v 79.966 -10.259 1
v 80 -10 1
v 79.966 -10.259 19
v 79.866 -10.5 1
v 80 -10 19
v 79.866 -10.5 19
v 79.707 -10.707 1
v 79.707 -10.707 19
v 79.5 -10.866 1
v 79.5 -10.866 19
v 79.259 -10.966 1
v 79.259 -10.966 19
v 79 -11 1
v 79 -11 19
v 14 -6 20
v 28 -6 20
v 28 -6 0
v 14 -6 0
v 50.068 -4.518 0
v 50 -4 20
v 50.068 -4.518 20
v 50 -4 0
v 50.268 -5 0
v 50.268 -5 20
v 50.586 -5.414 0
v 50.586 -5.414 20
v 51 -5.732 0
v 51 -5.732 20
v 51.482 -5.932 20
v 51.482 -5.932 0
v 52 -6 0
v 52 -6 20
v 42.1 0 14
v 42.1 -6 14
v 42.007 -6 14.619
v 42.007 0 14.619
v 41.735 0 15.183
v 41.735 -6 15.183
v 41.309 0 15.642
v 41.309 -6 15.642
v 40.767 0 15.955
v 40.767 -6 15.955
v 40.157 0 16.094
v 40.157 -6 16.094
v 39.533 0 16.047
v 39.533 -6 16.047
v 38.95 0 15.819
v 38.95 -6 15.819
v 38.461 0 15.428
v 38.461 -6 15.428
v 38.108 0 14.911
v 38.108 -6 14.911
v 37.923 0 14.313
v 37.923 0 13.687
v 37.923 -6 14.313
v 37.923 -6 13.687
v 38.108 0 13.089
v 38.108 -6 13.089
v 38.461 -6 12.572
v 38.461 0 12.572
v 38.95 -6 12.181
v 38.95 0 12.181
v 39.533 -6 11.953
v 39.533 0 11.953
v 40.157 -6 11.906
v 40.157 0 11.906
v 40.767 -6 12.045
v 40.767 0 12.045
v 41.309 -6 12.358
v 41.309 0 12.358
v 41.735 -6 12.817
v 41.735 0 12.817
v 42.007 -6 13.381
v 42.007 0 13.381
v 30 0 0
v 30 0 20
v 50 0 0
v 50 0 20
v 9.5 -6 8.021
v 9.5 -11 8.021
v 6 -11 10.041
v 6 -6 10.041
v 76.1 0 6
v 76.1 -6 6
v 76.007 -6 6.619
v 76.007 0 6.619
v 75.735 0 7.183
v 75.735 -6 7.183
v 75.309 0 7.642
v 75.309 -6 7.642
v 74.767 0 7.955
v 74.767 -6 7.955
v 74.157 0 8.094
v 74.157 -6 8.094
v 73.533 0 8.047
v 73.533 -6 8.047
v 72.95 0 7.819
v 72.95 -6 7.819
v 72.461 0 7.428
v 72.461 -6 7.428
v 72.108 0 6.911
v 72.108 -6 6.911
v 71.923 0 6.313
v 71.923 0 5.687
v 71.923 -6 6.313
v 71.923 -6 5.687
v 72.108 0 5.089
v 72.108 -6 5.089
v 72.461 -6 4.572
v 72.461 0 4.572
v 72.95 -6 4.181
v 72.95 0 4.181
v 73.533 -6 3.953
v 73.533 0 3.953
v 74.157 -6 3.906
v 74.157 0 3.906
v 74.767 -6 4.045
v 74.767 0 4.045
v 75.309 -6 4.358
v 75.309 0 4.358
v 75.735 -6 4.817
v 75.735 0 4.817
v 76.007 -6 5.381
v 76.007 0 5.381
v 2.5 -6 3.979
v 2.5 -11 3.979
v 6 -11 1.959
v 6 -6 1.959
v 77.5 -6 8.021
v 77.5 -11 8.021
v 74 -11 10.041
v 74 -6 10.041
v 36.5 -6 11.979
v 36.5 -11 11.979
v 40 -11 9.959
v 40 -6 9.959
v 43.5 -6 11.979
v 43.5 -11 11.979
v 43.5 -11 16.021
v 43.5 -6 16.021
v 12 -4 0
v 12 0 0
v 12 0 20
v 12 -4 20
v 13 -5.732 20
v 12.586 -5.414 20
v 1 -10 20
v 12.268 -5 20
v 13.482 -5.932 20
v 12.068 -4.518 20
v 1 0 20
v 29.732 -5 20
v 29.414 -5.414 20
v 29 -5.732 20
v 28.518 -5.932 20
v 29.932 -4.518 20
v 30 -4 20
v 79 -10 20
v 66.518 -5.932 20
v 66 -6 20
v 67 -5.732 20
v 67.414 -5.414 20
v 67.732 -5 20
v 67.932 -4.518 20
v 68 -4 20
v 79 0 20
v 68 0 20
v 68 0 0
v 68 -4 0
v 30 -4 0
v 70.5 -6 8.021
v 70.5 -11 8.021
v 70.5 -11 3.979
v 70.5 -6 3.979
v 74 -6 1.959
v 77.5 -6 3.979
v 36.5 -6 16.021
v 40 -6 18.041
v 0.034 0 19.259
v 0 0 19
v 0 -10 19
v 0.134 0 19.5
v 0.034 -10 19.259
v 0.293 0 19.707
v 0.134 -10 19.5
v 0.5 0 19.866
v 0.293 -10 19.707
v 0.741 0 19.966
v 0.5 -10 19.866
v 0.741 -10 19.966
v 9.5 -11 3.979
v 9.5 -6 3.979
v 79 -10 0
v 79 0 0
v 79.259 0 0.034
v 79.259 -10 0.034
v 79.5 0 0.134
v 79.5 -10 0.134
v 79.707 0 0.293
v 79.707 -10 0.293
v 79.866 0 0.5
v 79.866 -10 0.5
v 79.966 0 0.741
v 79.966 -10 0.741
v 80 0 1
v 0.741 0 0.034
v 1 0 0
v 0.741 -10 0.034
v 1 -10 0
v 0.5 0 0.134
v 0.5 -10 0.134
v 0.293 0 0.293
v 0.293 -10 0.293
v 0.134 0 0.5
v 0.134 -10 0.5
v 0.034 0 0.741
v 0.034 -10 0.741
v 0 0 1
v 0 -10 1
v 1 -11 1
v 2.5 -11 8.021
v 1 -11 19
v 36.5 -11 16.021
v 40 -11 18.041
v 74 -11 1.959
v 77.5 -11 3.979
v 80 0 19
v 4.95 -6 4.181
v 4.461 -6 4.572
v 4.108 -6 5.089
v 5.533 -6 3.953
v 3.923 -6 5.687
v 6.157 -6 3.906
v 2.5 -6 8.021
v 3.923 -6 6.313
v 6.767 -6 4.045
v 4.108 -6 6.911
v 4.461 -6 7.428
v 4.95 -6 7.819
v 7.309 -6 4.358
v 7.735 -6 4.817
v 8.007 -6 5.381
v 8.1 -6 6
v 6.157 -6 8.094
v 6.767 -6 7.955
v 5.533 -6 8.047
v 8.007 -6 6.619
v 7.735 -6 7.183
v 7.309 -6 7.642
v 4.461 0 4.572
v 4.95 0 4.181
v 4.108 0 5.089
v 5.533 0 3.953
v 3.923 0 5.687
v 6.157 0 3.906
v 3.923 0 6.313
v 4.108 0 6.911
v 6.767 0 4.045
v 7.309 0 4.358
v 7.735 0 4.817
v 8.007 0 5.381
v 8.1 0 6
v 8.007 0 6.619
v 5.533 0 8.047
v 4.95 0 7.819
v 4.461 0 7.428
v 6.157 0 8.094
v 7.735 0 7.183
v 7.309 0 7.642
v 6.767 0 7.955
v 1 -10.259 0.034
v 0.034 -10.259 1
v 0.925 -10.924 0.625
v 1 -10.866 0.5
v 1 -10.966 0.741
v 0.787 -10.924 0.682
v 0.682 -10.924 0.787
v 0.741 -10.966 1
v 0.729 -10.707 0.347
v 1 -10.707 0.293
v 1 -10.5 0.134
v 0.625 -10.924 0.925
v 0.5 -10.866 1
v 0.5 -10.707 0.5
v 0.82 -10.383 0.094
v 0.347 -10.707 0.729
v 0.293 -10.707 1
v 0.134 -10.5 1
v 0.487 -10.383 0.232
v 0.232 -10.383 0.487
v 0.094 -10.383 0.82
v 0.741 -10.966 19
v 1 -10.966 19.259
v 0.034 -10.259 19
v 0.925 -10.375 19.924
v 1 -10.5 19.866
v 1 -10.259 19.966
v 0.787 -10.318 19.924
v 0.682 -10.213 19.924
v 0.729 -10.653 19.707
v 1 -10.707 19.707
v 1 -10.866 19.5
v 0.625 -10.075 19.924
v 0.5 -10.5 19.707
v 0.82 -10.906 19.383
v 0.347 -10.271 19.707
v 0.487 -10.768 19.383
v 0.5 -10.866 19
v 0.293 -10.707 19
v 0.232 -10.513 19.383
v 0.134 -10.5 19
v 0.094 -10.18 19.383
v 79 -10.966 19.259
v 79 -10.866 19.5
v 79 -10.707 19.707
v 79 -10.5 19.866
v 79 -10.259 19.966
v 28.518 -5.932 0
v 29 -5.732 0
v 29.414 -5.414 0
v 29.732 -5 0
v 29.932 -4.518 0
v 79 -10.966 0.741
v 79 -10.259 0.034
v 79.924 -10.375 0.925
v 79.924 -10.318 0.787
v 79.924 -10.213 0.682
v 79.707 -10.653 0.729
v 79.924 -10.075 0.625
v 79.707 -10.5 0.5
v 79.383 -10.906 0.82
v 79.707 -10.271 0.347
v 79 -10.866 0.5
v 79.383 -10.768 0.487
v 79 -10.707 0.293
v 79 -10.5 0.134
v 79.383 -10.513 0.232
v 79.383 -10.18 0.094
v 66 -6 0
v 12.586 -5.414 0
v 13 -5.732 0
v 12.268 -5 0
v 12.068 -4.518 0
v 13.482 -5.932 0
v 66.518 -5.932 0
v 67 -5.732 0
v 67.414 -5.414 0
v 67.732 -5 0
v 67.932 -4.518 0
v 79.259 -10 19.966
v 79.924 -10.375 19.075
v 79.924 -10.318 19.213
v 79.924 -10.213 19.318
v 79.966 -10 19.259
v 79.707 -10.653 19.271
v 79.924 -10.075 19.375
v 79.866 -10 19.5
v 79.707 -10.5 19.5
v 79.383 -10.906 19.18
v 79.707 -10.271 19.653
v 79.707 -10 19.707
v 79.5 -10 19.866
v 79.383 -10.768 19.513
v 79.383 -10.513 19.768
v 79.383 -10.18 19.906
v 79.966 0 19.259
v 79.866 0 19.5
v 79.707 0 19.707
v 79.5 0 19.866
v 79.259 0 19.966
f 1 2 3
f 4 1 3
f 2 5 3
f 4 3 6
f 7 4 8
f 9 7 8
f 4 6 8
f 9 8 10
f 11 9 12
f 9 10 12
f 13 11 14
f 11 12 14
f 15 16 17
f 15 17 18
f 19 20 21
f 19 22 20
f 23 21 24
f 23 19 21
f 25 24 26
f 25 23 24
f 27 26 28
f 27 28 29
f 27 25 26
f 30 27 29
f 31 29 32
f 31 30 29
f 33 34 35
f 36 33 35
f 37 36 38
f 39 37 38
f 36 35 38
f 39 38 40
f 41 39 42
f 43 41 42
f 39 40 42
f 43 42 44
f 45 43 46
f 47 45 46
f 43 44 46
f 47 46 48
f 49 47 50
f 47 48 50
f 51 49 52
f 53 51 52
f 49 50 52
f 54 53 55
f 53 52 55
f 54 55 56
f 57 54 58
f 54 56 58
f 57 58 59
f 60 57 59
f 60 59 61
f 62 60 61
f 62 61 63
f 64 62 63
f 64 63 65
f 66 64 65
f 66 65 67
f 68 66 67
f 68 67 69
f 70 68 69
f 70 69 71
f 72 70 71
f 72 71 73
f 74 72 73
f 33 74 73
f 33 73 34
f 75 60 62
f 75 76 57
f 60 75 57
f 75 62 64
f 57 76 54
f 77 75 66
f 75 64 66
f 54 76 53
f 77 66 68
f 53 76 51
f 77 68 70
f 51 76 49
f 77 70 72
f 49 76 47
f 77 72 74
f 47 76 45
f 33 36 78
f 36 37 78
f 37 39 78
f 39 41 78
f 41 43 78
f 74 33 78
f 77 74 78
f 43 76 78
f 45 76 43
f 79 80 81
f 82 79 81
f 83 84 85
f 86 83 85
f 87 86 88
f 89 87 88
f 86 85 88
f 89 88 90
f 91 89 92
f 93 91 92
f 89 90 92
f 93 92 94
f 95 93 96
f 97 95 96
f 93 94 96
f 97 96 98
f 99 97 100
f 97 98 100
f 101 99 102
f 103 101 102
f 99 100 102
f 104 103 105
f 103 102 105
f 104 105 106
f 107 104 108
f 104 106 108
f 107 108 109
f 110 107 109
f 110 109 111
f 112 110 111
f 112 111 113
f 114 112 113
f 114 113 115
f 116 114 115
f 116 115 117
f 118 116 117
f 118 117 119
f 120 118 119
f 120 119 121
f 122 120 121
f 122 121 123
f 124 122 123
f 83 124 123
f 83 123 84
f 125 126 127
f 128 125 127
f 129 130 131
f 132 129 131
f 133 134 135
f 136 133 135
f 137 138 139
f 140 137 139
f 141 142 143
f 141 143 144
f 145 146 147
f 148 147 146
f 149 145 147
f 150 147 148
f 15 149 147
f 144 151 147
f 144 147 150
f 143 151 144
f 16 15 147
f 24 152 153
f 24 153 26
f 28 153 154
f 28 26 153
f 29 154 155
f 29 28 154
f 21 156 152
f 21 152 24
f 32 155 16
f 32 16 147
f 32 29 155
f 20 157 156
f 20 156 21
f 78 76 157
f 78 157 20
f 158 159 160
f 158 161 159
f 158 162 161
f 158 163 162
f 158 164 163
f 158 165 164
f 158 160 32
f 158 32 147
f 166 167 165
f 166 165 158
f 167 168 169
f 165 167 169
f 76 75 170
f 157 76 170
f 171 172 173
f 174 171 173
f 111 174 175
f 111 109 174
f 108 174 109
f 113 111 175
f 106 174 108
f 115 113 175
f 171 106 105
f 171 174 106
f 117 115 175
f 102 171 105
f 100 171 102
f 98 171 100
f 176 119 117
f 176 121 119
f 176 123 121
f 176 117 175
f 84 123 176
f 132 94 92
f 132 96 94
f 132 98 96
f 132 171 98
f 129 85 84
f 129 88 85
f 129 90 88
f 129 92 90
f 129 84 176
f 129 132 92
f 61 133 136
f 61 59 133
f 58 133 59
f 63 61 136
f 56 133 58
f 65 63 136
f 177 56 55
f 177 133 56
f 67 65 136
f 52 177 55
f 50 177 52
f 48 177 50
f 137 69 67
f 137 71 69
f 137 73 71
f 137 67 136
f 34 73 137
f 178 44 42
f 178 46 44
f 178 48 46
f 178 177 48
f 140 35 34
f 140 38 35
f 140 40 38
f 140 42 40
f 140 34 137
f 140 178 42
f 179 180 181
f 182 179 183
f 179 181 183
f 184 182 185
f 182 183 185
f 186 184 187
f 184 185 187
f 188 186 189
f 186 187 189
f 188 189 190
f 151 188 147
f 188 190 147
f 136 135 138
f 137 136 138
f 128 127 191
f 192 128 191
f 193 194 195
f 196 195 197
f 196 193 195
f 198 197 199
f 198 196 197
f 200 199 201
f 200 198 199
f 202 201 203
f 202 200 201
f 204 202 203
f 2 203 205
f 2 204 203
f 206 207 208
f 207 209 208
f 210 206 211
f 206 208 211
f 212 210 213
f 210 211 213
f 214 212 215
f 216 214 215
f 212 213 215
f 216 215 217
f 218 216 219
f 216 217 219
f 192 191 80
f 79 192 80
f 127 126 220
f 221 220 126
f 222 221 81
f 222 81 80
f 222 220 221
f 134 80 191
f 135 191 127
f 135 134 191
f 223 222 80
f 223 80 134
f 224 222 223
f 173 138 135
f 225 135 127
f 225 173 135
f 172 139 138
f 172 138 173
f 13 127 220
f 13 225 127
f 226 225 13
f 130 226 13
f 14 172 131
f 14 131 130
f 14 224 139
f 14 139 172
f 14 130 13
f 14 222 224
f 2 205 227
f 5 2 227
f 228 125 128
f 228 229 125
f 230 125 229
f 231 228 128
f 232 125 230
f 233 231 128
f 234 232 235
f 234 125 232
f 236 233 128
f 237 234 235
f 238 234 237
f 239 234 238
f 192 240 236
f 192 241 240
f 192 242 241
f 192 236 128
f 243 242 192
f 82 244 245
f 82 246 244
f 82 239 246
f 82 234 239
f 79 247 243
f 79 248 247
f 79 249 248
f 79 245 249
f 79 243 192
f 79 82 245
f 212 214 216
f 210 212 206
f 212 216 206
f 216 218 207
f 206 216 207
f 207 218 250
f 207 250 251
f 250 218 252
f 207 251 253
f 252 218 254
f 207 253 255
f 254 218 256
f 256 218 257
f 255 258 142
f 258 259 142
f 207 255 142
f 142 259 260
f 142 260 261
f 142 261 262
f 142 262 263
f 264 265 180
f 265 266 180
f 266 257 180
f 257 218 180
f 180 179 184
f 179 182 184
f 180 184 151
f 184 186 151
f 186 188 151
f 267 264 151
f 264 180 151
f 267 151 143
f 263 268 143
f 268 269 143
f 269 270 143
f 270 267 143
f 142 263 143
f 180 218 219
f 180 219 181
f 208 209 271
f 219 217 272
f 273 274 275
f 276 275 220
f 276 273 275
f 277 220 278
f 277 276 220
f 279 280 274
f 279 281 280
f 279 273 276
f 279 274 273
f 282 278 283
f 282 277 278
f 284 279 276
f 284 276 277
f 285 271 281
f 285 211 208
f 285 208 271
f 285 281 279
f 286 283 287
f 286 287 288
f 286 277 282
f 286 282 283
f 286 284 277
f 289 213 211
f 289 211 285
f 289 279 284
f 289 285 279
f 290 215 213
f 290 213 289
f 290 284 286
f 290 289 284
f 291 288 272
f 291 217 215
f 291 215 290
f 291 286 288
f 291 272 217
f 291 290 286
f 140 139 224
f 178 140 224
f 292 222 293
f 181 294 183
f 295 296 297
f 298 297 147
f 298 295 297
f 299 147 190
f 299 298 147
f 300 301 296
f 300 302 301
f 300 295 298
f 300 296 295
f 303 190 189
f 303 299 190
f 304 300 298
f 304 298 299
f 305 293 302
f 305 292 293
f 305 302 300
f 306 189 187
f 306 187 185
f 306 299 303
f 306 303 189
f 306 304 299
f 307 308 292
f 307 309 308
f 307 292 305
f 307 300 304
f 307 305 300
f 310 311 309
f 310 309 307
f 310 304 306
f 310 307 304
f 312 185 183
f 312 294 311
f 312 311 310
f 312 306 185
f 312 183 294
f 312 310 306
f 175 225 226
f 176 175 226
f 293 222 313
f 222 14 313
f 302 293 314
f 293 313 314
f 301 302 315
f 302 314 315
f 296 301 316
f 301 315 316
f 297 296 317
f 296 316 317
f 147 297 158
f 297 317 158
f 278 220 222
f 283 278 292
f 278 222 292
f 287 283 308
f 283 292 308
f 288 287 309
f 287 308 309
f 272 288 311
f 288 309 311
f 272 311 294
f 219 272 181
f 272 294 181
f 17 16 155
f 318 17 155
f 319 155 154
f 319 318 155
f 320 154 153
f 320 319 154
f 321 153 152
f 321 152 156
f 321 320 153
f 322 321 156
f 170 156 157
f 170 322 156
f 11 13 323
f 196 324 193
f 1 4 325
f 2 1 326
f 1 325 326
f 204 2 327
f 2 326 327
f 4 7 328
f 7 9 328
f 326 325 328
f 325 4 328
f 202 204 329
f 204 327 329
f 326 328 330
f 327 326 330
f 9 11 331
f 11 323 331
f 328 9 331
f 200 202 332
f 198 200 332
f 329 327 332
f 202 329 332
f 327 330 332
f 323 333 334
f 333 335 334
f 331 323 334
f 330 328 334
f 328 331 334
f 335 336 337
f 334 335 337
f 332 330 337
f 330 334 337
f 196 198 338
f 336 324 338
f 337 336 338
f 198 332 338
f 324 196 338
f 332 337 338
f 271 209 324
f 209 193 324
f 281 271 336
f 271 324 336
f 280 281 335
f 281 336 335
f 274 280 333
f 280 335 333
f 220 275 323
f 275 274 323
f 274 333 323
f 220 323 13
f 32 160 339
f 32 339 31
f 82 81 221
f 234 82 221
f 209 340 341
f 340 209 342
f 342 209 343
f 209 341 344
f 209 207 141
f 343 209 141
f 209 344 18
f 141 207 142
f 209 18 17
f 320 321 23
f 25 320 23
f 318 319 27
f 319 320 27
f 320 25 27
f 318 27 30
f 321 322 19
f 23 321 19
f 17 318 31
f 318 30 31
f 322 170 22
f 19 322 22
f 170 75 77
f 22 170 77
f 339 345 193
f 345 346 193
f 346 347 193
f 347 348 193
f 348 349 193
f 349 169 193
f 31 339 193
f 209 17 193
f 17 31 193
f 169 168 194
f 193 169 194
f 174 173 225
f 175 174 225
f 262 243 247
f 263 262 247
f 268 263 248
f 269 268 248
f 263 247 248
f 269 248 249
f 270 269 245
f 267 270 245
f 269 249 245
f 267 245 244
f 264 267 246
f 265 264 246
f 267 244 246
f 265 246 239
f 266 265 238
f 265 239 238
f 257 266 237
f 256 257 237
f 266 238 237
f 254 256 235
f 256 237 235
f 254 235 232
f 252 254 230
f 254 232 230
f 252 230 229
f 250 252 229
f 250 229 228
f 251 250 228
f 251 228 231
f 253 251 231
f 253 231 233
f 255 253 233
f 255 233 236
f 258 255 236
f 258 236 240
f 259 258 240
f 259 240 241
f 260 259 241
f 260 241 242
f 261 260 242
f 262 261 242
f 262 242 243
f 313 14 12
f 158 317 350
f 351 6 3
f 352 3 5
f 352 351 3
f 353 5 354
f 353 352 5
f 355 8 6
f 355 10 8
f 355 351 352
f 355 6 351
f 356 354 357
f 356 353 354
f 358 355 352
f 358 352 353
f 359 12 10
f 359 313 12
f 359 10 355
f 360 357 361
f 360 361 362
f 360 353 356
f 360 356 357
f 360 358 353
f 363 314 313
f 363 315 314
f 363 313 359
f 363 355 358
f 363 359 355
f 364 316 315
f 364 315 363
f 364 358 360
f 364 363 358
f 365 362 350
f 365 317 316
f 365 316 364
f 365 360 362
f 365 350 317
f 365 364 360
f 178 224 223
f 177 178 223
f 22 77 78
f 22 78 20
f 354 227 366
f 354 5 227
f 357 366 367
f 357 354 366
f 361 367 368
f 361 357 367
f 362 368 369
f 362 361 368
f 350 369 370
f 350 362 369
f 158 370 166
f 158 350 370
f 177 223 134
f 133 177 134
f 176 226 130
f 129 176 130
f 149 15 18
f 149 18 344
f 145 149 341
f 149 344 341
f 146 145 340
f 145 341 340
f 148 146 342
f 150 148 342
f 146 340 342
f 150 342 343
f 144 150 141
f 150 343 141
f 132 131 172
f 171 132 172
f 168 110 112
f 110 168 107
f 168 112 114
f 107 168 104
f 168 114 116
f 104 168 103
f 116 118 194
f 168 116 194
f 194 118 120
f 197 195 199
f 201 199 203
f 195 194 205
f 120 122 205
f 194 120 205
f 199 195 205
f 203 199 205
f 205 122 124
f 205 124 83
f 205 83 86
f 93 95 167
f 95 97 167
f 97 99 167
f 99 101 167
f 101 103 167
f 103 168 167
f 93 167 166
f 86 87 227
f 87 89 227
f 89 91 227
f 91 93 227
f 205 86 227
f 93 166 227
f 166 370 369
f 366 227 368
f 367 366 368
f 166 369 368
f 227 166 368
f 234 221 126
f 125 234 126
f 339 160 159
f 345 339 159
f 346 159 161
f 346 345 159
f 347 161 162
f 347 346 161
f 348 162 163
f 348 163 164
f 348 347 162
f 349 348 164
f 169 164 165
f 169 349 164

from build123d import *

# Parameters (mm, degrees)
SKETCH_W        = 80
SKETCH_H        = 20
PAD_DEPTH       = 11
SKETCH001_R     = 2.1
POCKET_DEPTH    = 11.001
POCKET001_DEPTH = 5
SKETCH003_W     = 18
SKETCH003_H     = 6
POCKET002_DEPTH = 20.001
FILLET_R        = 2
FILLET001_R     = 2
FILLET002_R     = 2
FILLET003_R     = 2
FILLET004_R     = 1


with BuildPart() as part:
    # Sketch → Pad (new body)
    with BuildSketch(Plane.XZ):
        with Locations((40, 10)):
            Rectangle(SKETCH_W, SKETCH_H)
    extrude(amount=PAD_DEPTH)

    # Sketch001 (on Face6 of Pad) → Pocket (cut, through all)
    with BuildSketch(Plane.XZ.offset(11)):
        with Locations((6, 6)):
            Circle(SKETCH001_R)
        with Locations((40, 14)):
            Circle(SKETCH001_R)
        with Locations((74, 6)):
            Circle(SKETCH001_R)
    extrude(amount=-POCKET_DEPTH, mode=Mode.SUBTRACT)

    # Sketch002 (on Face5 of Pocket) → Pocket001 (cut)
    with BuildSketch(Plane.XZ.offset(11)):
        Polygon((9.5, 3.979274), (9.5, 8.020726), (6, 10.041452), (2.5, 8.020726), (2.5, 3.979274), (6, 1.958548), align=None)
        Polygon((40, 9.958548), (43.5, 11.979274), (43.5, 16.020726), (40, 18.041452), (36.5, 16.020726), (36.5, 11.979274), align=None)
        Polygon((77.5, 3.979274), (77.5, 8.020726), (74, 10.041452), (70.5, 8.020726), (70.5, 3.979274), (74, 1.958548), align=None)
    extrude(amount=-POCKET001_DEPTH, mode=Mode.SUBTRACT)

    # Sketch003 (on Face6 of Pocket001) → Pocket002 (cut, through all)
    with BuildSketch(Plane(origin=(0, 0, 20), x_dir=(-1, 0, 0), z_dir=(0, 0, 1))):
        with Locations((-59, 3)):
            Rectangle(SKETCH003_W, SKETCH003_H)
        with Locations((-21, 3)):
            Rectangle(SKETCH003_W, SKETCH003_H)
    extrude(amount=-POCKET002_DEPTH, mode=Mode.SUBTRACT)

    # Fillet
    fillet_edges = [part.edges().sort_by_distance(p)[0] for p in [
        (50, -6, 10),
    ]]
    fillet(fillet_edges, radius=FILLET_R)

    # Fillet001
    fillet001_edges = [part.edges().sort_by_distance(p)[0] for p in [
        (12, -6, 10),
    ]]
    fillet(fillet001_edges, radius=FILLET001_R)

    # Fillet002
    fillet002_edges = [part.edges().sort_by_distance(p)[0] for p in [
        (30, -6, 10),
    ]]
    fillet(fillet002_edges, radius=FILLET002_R)

    # Fillet003
    fillet003_edges = [part.edges().sort_by_distance(p)[0] for p in [
        (68, -6, 10),
    ]]
    fillet(fillet003_edges, radius=FILLET003_R)

    # Fillet004
    fillet004_edges = [part.edges().sort_by_distance(p)[0] for p in [
        (0, -5.5, 0),
        (40, -11, 0),
        (0, -11, 10),
        (40, -11, 20),
        (80, -11, 10),
        (80, -5.5, 0),
        (80, -5.5, 20),
        (0, -5.5, 20),
    ]]
    fillet(fillet004_edges, radius=FILLET004_R)


solid = part.part
